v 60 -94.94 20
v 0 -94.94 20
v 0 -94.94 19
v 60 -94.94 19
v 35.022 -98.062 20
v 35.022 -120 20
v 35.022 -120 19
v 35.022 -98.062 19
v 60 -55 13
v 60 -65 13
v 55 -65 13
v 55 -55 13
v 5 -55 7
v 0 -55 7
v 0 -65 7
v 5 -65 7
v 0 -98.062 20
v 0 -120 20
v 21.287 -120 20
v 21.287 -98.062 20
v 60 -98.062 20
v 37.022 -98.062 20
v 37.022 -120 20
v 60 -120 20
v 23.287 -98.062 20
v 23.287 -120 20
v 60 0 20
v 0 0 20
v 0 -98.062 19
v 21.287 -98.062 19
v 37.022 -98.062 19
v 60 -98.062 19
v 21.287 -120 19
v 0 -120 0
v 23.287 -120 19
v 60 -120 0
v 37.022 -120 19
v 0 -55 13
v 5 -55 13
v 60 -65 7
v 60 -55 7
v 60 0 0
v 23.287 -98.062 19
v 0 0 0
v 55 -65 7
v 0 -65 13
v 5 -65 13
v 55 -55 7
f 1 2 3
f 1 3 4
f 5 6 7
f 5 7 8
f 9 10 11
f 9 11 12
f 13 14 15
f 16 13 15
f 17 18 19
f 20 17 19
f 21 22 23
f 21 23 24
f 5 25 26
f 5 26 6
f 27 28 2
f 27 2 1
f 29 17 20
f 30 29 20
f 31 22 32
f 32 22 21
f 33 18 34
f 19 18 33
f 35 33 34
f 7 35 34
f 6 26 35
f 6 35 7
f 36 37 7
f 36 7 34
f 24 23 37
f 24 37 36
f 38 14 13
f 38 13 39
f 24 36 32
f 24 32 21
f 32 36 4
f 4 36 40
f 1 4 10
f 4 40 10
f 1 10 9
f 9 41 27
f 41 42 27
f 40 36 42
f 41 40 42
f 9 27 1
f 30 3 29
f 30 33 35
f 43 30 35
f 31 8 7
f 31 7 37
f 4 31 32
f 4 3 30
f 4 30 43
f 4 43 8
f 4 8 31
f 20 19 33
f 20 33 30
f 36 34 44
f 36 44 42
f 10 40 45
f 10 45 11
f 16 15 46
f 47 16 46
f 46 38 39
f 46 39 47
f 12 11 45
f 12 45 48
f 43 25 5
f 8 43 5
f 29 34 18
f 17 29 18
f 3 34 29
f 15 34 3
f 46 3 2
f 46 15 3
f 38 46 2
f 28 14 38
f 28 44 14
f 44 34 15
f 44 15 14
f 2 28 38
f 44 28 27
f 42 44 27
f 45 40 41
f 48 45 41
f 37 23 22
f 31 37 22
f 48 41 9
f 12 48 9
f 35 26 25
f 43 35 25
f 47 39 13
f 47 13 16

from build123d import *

# Parameters (mm, degrees)
F0_W     = 60
F0_H     = 20
F1_DEPTH = 120
F2_W     = 60
F2_H     = 3.121510148
F3_DEPTH = 1
F4_W     = 2
F4_H     = 21.938483119
F5_DEPTH = 1
F6_W     = 10
F6_H     = 6
F7_DEPTH = 5
F8_W     = 10
F8_H     = 6
F9_DEPTH = 5


with BuildPart() as f1:
    # F0 (on Front) → F1 (new body)
    with BuildSketch(Plane.XZ):
        with Locations((30, 10)):
            Rectangle(F0_W, F0_H)
    extrude(amount=F1_DEPTH)

    # F2 (on face) → F3 (cut)
    with BuildSketch(Plane.XY.offset(20)):
        with Locations((30, -96.500761807)):
            Rectangle(F2_W, F2_H)
    extrude(amount=-F3_DEPTH, mode=Mode.SUBTRACT)

    # F4 (on face) → F5 (cut)
    with BuildSketch(Plane.XY.offset(20)):
        with Locations((36.0219793618, -109.0307584405)):
            Rectangle(F4_W, F4_H)
        with Locations((22.2871395051, -109.0307584405)):
            Rectangle(F4_W, F4_H)
    extrude(amount=-F5_DEPTH, mode=Mode.SUBTRACT)

    # F6 (on face) → F7 (cut)
    with BuildSketch(Plane.YZ.offset(60)):
        with Locations((-60, 10)):
            Rectangle(F6_W, F6_H)
    extrude(amount=-F7_DEPTH, mode=Mode.SUBTRACT)

    # F8 (on face) → F9 (cut)
    with BuildSketch(Plane(origin=(0, 0, 0), x_dir=(0, -1, 0), z_dir=(-1, 0, 0))):
        with Locations((60, 10)):
            Rectangle(F8_W, F8_H)
    extrude(amount=-F9_DEPTH, mode=Mode.SUBTRACT)


solid = f1.part
